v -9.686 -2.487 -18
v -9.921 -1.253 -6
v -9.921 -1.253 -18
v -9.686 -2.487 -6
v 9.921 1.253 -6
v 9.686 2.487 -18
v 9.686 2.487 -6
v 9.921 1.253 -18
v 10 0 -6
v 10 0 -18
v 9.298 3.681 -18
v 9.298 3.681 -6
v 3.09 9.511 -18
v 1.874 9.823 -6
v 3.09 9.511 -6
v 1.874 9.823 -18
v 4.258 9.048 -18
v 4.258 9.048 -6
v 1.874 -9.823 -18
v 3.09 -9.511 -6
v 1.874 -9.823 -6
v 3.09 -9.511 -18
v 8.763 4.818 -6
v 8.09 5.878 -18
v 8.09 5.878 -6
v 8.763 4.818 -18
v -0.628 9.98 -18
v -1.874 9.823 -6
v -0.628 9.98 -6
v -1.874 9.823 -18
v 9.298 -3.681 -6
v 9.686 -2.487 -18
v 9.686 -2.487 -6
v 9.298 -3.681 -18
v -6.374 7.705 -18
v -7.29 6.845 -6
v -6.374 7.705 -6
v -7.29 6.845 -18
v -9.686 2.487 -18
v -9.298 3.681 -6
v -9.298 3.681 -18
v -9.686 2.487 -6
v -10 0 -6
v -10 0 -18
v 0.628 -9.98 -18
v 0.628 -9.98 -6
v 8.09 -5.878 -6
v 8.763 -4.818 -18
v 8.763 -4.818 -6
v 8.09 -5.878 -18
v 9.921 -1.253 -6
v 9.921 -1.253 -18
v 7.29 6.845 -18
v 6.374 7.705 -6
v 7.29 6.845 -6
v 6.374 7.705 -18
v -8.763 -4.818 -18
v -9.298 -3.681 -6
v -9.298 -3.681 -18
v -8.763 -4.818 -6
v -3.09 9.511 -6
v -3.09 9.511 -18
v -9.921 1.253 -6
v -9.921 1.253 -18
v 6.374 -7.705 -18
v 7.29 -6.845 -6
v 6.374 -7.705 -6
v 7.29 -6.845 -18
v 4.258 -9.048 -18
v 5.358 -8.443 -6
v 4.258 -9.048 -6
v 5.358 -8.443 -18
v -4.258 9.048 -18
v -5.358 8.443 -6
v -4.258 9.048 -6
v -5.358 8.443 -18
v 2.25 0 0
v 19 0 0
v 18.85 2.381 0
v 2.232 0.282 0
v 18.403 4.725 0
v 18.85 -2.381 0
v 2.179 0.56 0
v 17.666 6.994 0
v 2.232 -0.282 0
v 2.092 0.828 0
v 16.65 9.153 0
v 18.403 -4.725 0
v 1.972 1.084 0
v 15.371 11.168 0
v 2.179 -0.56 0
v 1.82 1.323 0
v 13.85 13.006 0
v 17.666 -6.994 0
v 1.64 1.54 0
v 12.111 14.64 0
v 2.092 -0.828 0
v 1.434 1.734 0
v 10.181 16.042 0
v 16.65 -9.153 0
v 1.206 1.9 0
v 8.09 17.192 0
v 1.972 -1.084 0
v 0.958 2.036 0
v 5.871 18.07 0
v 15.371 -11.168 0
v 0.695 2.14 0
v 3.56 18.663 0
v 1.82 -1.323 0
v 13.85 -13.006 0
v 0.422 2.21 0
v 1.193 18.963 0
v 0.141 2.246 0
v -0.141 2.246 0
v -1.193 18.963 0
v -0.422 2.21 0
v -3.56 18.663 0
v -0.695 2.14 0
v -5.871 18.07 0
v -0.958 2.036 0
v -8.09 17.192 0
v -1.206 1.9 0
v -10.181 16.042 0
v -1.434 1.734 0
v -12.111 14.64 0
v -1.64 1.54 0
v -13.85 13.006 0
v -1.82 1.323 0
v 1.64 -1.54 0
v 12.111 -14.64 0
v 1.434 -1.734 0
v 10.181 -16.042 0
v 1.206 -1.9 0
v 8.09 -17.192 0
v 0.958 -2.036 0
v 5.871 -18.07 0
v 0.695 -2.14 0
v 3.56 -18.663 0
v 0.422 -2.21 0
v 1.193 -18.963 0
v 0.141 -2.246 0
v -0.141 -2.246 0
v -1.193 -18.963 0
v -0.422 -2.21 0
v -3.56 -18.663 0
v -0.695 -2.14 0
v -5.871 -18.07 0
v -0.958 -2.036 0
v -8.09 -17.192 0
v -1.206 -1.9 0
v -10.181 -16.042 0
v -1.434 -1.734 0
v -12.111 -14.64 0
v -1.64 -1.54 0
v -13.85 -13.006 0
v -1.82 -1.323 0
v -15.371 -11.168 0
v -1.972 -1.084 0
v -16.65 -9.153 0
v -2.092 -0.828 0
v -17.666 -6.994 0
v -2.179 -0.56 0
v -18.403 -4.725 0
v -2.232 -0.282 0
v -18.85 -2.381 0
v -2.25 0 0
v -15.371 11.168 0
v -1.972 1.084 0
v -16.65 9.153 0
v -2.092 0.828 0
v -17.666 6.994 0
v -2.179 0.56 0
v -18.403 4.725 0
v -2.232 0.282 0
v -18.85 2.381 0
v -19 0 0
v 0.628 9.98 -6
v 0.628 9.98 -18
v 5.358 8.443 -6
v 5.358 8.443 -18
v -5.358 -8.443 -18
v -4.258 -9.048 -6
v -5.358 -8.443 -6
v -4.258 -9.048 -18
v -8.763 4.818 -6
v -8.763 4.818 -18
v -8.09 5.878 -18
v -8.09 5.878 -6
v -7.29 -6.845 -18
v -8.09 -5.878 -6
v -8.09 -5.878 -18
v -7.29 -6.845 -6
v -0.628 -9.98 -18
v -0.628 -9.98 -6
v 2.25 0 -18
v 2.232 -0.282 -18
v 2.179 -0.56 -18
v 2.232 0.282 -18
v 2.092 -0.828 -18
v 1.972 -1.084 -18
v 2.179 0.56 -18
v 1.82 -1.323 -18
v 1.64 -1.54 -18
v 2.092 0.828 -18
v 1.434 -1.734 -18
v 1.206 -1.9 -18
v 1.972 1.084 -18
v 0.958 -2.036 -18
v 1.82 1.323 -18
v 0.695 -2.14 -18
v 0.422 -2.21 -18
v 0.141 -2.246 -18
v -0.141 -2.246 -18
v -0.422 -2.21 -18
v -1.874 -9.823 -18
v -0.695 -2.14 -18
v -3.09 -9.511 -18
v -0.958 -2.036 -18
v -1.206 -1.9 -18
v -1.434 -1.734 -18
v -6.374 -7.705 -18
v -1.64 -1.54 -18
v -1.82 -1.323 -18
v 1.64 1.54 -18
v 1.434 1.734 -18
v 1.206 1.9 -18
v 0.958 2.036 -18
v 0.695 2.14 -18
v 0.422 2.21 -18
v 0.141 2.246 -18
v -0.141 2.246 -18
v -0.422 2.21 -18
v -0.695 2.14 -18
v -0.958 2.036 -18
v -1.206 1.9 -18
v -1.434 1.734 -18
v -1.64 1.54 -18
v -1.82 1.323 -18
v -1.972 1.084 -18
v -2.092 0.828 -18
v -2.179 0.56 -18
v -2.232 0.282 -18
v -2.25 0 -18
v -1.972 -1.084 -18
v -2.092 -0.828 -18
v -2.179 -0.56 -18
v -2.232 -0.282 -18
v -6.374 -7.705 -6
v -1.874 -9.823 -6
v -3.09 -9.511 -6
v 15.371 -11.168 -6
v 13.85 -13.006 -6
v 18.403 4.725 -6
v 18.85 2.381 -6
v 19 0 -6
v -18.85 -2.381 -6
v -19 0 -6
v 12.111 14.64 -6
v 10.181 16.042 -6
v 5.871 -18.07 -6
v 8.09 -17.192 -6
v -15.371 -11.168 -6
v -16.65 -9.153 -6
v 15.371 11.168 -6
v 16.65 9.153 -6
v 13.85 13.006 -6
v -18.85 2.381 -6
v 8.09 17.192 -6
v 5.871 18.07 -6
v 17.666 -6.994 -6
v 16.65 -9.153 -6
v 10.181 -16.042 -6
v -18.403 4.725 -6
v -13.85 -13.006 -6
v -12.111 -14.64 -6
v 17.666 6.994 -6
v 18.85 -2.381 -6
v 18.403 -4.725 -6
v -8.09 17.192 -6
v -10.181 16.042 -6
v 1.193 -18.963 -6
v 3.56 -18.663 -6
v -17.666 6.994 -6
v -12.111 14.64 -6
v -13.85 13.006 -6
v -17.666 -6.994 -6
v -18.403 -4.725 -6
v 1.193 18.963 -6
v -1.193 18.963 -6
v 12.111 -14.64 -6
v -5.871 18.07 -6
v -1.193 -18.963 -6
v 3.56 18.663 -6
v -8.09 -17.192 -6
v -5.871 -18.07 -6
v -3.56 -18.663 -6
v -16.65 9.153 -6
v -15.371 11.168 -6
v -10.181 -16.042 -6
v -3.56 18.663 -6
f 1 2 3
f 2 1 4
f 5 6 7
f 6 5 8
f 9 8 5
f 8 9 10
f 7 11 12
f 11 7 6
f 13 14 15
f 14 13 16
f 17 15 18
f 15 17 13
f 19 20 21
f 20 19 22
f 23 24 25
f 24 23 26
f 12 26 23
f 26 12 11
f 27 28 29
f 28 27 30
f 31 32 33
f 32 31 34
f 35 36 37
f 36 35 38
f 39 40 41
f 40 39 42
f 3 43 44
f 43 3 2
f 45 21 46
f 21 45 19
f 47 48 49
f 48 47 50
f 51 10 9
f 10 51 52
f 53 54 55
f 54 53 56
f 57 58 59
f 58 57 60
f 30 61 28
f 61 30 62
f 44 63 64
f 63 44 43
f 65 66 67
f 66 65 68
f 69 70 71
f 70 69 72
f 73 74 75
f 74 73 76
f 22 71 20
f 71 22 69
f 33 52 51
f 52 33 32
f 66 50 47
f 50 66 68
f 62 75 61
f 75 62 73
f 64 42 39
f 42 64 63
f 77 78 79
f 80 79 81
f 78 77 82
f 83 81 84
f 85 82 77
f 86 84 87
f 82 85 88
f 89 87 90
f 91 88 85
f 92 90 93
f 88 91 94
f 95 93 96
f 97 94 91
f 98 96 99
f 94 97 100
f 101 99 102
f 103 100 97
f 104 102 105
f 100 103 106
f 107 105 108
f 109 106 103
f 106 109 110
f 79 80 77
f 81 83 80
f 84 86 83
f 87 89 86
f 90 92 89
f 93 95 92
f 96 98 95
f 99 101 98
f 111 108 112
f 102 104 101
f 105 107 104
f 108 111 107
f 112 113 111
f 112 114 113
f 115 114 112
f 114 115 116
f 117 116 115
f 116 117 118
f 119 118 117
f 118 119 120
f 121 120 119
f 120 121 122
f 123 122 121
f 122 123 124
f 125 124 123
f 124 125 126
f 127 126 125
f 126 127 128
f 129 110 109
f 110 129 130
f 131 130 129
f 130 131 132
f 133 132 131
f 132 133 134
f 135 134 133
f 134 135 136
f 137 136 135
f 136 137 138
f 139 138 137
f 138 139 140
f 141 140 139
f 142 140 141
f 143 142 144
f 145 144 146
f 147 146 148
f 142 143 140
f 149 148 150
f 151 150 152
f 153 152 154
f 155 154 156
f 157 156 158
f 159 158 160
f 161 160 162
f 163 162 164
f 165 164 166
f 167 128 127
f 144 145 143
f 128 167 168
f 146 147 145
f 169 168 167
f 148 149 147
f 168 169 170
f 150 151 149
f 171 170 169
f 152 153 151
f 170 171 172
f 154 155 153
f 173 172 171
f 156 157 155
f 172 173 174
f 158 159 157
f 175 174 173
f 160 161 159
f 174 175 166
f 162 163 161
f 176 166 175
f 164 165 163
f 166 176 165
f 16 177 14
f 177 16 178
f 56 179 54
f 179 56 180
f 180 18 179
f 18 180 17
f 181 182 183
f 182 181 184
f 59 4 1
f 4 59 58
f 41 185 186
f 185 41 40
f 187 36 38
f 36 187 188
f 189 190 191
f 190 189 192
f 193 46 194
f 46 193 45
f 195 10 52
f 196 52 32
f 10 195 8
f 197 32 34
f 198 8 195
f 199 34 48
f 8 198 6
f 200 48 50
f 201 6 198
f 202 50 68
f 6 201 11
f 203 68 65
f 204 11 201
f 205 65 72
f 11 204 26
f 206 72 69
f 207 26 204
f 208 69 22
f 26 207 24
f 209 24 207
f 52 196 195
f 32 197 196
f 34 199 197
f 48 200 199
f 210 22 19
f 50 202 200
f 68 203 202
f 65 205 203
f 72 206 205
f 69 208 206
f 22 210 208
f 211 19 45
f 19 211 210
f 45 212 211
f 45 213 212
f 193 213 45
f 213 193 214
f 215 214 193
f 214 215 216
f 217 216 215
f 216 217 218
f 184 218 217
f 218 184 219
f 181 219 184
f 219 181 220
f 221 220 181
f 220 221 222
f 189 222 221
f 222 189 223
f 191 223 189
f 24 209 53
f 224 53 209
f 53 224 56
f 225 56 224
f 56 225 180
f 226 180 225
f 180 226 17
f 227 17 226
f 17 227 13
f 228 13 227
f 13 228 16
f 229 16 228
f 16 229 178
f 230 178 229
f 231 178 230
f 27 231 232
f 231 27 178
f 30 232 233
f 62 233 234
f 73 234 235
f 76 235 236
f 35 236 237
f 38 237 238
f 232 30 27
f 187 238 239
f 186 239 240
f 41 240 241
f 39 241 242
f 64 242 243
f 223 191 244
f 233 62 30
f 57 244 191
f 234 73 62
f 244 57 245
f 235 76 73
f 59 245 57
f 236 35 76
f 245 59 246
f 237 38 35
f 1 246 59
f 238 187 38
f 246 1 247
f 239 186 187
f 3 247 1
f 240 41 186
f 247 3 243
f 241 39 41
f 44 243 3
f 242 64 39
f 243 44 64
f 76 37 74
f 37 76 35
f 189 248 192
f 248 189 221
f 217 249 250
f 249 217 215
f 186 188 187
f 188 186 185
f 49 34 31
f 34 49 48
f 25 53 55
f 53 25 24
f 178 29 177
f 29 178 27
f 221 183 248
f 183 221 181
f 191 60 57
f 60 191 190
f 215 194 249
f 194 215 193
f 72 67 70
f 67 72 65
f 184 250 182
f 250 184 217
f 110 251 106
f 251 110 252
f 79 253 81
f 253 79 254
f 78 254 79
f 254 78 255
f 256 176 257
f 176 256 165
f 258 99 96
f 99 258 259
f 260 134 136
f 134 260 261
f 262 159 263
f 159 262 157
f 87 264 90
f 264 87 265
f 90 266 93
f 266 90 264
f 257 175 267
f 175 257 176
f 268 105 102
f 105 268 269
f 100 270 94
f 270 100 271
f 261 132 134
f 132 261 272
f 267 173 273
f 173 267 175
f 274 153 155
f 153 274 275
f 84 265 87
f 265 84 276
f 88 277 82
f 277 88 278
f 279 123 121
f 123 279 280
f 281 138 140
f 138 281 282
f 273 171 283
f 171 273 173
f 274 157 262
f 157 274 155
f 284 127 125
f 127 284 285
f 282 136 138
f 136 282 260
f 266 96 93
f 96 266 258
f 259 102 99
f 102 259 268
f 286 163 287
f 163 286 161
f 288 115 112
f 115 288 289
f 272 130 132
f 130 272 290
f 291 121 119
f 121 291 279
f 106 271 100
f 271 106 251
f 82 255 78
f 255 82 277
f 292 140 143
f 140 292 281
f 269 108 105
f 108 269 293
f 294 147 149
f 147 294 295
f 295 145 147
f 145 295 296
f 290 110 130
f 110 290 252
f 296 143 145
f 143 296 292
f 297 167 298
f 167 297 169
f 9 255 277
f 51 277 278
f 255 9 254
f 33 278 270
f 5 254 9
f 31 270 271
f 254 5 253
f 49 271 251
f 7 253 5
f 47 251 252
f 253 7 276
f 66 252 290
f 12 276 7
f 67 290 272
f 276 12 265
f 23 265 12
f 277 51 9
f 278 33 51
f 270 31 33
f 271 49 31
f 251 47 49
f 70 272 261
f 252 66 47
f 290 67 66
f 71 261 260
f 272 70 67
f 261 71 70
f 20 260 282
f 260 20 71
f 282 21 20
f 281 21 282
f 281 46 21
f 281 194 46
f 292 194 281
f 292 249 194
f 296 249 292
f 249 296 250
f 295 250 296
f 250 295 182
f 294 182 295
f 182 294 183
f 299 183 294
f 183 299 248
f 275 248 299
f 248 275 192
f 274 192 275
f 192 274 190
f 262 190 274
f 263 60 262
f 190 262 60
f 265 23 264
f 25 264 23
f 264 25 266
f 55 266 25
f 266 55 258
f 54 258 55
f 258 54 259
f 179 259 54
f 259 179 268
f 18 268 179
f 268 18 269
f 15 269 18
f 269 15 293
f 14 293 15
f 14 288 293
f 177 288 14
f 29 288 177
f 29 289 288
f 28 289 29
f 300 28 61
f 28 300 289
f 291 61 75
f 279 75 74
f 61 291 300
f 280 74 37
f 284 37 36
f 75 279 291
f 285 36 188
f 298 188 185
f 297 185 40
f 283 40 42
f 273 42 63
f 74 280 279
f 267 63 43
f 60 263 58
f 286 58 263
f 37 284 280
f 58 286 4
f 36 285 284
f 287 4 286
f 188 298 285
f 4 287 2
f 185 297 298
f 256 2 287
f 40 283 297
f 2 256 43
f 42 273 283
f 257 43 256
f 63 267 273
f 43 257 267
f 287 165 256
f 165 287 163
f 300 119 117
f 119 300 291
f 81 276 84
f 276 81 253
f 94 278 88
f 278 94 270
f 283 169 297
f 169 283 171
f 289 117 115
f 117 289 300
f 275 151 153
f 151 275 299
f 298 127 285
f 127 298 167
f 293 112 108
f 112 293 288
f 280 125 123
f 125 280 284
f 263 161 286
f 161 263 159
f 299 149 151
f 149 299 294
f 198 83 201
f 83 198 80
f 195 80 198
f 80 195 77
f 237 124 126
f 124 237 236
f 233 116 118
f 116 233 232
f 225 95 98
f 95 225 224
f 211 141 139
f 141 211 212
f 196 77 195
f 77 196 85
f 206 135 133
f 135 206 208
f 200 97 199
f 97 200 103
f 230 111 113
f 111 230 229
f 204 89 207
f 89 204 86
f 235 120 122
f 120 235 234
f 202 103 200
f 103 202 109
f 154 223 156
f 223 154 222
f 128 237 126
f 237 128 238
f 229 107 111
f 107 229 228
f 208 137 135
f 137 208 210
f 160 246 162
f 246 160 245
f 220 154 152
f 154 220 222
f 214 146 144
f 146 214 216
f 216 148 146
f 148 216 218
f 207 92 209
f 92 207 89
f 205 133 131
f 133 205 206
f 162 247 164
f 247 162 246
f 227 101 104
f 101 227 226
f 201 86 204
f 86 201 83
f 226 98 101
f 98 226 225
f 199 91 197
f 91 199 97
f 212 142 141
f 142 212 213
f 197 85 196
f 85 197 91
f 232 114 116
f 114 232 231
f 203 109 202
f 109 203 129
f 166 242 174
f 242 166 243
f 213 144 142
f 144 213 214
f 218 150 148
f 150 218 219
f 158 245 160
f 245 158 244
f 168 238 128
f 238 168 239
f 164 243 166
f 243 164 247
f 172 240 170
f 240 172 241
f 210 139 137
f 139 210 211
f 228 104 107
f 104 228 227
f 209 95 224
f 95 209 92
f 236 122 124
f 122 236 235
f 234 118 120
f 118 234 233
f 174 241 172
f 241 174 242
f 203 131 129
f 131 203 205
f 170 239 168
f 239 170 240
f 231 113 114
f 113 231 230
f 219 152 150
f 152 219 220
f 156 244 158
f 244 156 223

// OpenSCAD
$fn = 50;


difference() {
	union() {
		translate(v = [0, 0, -18.0000000000]) {
			cylinder(h = 18, r = 10.0000000000);
		}
		translate(v = [0, 0, -6.0000000000]) {
			cylinder(h = 6, r = 19.0000000000);
		}
	}
	union() {
		#translate(v = [0, 0, -18]) {
			cylinder(h = 18, r = 2.2500000000);
		}
	}
}
